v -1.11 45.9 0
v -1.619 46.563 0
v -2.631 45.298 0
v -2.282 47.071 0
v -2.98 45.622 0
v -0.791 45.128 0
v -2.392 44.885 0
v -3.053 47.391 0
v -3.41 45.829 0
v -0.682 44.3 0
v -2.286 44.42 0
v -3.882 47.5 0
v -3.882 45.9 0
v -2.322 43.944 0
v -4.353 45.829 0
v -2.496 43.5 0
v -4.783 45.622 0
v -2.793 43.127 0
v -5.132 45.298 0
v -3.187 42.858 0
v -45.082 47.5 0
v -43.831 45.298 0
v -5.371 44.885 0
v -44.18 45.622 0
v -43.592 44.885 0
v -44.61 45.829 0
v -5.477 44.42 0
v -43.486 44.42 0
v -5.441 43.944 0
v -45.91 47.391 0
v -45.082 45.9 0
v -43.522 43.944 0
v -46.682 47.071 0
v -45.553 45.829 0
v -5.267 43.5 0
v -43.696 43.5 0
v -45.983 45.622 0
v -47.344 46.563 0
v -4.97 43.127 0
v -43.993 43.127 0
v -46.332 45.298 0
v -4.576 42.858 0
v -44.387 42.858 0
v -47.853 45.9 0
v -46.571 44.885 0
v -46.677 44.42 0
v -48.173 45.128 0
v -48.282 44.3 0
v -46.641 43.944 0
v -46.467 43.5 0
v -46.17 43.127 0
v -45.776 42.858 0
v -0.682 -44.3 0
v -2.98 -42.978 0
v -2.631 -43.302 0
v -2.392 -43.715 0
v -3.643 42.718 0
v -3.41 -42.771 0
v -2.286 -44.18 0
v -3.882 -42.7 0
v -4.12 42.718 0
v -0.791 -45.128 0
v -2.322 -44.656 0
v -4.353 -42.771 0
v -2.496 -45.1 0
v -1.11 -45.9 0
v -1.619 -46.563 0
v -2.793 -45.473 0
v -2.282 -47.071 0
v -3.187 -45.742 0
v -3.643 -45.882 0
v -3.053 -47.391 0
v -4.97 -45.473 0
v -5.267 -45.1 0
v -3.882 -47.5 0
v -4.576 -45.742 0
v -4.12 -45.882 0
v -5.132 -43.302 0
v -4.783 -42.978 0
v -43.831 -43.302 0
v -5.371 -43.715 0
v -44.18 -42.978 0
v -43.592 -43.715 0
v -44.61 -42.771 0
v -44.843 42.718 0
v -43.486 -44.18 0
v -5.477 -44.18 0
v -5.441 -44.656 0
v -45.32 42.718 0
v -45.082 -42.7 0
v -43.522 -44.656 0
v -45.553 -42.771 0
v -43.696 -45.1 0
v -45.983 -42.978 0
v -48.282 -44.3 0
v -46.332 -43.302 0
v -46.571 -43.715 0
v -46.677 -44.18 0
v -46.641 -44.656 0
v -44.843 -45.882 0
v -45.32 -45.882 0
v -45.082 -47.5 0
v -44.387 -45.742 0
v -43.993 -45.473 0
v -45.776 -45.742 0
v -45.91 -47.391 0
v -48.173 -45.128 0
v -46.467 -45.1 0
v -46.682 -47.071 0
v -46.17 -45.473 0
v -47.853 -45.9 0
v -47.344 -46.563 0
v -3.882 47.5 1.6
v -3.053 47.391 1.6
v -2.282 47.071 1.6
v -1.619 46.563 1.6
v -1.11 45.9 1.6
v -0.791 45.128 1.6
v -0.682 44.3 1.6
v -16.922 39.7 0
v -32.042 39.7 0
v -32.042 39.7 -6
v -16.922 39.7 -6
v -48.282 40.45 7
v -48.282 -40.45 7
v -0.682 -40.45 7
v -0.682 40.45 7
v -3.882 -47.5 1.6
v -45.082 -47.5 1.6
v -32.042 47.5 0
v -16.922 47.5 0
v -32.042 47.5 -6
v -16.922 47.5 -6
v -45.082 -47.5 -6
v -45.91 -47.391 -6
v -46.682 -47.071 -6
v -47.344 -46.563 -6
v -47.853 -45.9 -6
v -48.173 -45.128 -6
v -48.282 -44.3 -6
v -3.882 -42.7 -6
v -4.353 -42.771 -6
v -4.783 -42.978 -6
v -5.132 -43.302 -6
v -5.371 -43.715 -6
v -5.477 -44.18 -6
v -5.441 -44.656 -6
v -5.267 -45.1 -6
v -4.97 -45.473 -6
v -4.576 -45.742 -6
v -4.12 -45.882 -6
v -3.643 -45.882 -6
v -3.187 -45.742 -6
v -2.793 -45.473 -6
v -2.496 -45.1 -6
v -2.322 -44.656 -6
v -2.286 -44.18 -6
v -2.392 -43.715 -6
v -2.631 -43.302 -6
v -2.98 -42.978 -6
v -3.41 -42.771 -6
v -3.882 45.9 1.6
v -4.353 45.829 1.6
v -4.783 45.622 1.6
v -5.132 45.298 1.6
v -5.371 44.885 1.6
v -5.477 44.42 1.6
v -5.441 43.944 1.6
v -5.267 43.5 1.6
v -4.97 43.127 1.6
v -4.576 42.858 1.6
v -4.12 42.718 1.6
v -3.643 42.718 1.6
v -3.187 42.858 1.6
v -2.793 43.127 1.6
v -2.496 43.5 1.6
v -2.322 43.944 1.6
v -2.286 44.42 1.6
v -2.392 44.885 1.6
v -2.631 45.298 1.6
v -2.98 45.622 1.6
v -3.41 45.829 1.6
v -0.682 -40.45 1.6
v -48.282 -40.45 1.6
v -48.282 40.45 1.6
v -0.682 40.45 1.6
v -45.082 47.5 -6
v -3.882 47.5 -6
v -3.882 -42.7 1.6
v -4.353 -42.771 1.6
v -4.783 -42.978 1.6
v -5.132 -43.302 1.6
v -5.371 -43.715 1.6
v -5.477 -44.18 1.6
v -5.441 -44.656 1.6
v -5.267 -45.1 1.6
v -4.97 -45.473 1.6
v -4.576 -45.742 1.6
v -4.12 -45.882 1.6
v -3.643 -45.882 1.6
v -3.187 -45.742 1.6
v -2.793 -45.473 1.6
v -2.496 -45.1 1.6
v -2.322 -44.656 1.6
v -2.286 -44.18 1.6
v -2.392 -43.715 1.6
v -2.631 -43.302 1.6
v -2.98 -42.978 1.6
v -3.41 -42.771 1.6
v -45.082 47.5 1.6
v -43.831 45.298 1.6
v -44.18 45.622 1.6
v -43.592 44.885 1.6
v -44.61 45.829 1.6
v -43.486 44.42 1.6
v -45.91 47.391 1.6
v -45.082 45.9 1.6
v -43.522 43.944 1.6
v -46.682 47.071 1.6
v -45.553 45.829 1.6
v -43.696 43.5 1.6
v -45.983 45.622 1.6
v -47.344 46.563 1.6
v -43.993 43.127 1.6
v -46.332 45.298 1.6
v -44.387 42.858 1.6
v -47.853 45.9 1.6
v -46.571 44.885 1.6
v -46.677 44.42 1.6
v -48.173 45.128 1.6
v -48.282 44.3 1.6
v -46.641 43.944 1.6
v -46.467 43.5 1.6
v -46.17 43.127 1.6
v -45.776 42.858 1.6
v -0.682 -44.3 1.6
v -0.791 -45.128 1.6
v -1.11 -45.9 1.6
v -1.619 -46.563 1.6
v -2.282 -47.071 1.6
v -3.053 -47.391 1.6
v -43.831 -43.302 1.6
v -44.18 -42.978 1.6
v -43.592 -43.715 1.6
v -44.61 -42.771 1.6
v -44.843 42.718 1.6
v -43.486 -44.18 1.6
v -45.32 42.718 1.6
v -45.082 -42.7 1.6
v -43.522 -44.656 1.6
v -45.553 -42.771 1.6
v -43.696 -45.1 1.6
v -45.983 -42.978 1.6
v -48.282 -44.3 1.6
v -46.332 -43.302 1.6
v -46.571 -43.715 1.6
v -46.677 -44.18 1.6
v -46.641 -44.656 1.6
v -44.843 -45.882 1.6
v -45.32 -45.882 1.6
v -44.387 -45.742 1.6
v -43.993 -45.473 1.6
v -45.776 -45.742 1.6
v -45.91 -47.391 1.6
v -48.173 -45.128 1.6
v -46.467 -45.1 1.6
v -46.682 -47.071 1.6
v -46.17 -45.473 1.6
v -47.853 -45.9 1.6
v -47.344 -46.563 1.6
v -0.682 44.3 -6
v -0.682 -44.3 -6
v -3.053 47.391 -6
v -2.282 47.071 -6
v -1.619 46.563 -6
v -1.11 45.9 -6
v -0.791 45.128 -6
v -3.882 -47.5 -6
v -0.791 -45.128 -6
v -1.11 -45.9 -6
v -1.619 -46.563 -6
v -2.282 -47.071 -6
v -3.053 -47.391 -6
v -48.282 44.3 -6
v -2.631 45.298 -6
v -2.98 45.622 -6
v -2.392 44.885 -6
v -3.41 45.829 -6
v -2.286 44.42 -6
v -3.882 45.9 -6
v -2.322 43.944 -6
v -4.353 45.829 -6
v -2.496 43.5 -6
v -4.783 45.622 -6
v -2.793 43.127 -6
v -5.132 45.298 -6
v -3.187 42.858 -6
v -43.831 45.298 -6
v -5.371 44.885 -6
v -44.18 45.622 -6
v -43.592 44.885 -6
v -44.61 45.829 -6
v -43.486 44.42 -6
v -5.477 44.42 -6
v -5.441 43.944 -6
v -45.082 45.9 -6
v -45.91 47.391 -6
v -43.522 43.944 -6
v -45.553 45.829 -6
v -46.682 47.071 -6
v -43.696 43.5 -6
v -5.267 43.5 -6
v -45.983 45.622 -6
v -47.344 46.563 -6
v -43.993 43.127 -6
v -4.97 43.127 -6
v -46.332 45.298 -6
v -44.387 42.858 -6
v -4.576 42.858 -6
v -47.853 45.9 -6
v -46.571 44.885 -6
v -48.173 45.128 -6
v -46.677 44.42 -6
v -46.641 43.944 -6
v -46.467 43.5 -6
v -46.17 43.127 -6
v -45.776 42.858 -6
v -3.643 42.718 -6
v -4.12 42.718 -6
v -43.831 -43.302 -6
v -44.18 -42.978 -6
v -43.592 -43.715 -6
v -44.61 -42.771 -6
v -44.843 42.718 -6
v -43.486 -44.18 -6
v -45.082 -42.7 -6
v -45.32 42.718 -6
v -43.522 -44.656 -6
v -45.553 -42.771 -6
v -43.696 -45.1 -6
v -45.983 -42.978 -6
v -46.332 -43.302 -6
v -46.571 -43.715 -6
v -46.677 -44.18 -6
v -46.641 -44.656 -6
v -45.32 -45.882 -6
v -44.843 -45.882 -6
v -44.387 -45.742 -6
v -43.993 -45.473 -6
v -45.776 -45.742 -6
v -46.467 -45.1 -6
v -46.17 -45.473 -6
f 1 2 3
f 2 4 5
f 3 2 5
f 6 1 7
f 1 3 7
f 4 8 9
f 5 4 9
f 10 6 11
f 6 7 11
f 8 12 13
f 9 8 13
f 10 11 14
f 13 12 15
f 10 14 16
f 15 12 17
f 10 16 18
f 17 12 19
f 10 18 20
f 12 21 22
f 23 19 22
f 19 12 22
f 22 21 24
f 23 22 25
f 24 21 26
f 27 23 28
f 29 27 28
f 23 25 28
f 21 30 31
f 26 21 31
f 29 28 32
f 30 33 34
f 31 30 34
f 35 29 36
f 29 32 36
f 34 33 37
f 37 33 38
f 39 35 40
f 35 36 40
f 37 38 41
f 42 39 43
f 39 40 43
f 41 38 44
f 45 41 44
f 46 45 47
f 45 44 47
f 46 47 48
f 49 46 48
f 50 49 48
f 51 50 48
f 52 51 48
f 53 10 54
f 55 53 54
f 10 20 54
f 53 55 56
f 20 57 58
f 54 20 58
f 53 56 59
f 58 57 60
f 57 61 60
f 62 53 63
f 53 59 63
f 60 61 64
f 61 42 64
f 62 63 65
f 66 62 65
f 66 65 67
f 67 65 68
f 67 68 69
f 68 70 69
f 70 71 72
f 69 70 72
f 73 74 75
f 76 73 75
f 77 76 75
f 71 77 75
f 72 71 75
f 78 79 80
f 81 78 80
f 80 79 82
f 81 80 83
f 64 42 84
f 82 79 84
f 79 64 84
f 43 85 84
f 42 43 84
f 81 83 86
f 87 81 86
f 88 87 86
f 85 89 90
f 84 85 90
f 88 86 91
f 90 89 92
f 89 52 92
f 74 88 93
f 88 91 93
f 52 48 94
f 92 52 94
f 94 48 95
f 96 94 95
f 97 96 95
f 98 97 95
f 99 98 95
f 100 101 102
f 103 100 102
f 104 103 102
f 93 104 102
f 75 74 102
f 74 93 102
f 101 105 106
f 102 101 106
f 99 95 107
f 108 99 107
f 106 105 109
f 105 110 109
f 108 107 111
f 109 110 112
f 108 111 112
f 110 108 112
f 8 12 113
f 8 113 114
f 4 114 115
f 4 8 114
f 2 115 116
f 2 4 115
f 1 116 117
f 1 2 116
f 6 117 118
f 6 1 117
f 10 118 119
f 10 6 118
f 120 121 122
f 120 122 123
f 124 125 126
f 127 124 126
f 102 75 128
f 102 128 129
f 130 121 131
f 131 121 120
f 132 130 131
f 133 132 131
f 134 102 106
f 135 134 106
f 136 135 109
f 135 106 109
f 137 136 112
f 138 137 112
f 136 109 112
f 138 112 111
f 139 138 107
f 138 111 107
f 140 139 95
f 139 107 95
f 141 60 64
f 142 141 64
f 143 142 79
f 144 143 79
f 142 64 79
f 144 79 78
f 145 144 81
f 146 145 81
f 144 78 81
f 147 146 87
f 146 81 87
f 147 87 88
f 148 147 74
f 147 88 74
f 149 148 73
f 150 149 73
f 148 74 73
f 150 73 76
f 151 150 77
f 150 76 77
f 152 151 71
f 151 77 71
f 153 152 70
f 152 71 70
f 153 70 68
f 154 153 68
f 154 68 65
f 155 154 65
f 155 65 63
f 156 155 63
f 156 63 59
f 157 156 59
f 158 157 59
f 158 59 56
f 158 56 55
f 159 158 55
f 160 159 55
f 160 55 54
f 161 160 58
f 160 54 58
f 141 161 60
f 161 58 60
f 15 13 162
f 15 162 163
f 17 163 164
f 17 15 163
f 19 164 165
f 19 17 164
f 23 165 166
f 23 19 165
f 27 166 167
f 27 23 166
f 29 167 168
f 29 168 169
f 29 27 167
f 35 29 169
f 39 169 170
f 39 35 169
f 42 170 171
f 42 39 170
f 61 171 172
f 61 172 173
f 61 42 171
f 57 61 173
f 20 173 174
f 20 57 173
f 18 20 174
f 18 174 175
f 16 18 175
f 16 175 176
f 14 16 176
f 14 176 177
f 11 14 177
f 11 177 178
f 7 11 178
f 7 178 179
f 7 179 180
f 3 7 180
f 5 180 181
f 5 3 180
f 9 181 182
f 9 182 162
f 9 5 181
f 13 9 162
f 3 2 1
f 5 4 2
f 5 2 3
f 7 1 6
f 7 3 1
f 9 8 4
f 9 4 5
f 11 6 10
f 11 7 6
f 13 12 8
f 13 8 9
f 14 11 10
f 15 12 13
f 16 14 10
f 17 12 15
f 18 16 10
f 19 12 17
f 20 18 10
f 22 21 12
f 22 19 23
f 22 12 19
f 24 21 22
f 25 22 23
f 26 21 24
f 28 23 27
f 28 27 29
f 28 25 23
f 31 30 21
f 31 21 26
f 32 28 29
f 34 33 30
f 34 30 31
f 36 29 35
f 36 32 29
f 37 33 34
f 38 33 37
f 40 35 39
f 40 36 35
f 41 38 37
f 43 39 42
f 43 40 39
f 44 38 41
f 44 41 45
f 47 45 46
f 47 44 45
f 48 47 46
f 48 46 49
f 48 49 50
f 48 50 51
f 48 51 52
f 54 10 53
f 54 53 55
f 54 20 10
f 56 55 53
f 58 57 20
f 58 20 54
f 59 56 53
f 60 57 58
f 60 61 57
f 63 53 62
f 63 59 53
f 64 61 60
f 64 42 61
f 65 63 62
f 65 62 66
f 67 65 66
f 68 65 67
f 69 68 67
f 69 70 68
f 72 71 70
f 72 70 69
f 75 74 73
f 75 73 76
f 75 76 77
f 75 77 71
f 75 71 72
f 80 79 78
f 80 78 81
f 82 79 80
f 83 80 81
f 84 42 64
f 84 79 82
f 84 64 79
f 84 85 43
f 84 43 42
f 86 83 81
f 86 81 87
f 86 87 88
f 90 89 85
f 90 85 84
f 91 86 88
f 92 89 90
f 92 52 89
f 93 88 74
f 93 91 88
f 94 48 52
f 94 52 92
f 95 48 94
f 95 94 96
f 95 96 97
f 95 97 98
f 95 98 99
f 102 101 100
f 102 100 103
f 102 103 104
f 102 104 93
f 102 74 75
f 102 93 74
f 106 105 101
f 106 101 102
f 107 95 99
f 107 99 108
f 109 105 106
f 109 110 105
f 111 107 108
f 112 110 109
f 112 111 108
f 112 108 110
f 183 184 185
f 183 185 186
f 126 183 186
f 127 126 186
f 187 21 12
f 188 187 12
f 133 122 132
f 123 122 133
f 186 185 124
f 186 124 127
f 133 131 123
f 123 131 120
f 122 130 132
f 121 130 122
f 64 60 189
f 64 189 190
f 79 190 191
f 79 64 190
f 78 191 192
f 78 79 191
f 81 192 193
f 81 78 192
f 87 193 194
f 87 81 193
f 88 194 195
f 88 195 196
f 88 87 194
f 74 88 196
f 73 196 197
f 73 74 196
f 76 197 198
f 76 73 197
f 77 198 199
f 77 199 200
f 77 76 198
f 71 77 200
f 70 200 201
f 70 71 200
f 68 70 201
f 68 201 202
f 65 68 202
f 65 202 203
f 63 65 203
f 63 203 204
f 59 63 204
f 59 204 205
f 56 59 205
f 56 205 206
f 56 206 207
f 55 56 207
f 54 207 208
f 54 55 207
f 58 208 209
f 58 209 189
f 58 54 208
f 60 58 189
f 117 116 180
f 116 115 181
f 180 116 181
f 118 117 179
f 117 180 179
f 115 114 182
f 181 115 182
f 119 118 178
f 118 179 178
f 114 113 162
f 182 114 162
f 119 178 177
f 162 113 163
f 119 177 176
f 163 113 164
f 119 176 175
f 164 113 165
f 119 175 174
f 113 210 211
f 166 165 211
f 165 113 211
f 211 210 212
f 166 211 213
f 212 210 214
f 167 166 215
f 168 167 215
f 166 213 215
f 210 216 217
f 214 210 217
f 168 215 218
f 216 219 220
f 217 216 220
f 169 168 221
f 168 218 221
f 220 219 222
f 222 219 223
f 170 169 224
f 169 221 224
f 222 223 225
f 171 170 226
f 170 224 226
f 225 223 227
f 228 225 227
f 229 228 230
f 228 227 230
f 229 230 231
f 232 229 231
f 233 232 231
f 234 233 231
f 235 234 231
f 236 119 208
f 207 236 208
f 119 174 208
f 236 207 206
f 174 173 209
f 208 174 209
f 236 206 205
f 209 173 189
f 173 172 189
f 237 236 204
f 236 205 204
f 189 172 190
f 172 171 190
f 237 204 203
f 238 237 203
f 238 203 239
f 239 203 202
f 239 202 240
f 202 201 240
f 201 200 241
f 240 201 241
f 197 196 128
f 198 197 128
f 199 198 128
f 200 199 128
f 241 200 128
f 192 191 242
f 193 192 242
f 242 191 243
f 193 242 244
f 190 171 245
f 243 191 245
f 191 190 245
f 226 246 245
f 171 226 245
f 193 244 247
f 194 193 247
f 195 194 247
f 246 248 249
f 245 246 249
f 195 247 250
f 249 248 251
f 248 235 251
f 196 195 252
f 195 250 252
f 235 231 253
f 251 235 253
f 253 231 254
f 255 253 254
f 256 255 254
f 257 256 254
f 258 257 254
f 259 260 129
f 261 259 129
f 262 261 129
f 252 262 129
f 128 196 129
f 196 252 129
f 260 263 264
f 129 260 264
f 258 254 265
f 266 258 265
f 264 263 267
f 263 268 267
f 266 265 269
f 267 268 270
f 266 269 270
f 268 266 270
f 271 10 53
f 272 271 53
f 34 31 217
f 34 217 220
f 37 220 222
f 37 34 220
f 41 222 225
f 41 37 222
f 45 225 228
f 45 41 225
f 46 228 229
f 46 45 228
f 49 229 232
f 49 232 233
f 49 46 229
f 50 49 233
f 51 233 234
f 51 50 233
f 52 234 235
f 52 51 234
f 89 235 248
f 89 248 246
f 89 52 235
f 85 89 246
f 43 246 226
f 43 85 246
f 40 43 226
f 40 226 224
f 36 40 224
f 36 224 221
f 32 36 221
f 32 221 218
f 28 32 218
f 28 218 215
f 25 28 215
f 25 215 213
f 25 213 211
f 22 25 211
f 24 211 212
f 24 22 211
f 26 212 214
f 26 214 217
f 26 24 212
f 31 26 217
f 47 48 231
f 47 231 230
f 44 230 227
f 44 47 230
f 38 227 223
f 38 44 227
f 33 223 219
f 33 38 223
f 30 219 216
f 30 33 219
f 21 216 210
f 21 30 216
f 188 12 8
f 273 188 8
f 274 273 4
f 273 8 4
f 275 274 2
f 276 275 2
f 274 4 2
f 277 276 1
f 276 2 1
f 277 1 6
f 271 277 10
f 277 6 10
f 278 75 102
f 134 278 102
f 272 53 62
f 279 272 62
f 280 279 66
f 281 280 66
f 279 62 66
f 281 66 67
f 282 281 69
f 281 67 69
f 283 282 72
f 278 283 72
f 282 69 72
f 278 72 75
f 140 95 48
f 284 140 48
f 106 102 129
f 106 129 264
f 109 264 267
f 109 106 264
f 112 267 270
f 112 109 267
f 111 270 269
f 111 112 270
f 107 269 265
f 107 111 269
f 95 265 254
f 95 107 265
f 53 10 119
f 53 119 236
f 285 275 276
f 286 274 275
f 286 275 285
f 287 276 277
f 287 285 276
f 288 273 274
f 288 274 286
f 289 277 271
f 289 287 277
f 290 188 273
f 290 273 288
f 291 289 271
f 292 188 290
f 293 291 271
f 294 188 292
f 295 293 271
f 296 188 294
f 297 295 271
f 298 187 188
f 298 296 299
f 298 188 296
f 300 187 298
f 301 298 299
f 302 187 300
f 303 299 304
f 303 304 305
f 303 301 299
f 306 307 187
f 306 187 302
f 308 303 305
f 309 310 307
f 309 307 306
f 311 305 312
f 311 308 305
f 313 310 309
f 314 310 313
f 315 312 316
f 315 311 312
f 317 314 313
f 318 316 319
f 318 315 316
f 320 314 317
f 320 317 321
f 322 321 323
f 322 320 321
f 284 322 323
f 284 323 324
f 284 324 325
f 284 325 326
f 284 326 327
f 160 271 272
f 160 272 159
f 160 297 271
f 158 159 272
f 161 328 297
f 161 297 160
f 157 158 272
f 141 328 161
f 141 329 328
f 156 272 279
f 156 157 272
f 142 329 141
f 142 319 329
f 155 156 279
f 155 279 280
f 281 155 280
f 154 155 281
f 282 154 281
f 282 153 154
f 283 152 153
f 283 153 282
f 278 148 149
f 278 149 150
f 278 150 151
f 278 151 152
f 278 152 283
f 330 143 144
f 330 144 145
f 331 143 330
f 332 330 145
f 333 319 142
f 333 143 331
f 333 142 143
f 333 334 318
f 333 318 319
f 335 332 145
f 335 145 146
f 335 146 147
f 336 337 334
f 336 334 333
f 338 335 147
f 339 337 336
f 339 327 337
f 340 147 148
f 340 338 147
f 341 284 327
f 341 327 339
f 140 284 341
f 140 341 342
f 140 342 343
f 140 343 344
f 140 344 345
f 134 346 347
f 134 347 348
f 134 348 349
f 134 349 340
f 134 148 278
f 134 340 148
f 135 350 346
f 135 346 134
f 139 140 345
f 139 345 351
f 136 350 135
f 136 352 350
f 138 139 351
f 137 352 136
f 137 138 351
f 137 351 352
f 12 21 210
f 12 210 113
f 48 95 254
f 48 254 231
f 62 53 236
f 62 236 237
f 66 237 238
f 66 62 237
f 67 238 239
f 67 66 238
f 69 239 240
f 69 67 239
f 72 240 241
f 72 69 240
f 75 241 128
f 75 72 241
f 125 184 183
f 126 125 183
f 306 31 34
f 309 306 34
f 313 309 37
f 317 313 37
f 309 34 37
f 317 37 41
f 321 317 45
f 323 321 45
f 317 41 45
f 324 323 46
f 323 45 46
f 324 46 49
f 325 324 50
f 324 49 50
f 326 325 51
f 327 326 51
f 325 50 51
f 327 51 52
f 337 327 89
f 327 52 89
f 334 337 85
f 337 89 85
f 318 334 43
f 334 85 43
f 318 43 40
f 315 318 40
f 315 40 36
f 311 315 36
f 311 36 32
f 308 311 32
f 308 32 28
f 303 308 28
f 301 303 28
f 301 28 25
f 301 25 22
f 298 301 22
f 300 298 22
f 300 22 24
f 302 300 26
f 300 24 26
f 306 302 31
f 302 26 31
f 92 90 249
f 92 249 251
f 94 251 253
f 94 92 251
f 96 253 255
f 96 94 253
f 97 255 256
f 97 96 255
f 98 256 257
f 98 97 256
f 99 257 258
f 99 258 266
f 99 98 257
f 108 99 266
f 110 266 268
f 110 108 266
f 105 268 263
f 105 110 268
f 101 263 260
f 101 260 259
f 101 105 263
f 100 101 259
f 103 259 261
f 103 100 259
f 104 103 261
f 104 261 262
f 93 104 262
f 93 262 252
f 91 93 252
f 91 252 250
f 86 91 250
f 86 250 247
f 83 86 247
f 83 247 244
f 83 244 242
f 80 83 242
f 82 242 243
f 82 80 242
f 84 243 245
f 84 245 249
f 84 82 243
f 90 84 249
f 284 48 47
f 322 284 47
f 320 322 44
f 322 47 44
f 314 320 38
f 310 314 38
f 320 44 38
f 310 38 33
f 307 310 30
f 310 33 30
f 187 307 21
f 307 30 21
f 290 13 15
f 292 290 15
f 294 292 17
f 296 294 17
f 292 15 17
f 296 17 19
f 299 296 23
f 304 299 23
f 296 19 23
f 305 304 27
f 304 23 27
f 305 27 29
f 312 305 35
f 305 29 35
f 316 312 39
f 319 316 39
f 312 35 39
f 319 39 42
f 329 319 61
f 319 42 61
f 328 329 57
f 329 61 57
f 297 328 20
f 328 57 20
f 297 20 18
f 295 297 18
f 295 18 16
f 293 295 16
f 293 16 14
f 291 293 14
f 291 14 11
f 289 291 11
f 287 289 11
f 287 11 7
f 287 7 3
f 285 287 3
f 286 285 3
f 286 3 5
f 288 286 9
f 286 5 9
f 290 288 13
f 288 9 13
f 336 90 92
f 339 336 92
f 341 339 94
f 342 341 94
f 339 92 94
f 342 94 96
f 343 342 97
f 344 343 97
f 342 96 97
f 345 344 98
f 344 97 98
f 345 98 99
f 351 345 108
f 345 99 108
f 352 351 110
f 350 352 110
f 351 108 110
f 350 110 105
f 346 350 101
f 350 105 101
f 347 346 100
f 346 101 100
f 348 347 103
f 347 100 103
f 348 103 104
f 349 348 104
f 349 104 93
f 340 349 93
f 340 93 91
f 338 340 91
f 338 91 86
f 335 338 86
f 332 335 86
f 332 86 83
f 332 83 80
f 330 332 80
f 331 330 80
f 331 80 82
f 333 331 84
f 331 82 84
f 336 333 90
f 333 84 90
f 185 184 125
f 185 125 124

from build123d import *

# Parameters (mm, degrees)
SKETCH1_R           = 1.6
BOSS_EXTRUDE1_DEPTH = 1.6
SKETCH2_W           = 47.6
SKETCH2_H           = 80.9
BOSS_EXTRUDE2_DEPTH = 5.4
SKETCH1_2_R         = 1.6
BOSS_EXTRUDE3_DEPTH = 6
SKETCH3_W           = 15.12
SKETCH3_H           = 7.8
BOSS_EXTRUDE4_DEPTH = 6


with BuildPart() as part:
    # Sketch1 → Boss-Extrude1 (new body)
    with BuildSketch(Plane(origin=(0, 0, 0), x_dir=(0, 1, 0), z_dir=(0, 0, 1))):
        with BuildLine():
            Line((-47.5, 3.881555812), (-47.5, 45.081555812))
            ThreePointArc((-47.5, 45.081555812), (-46.5627417, 47.344297512), (-44.3, 48.281555812))
            Line((-44.3, 48.281555812), (44.3, 48.281555812))
            ThreePointArc((44.3, 48.281555812), (46.5627417, 47.344297512), (47.5, 45.081555812))
            Line((47.5, 45.081555812), (47.5, 3.881555812))
            ThreePointArc((47.5, 3.881555812), (46.5627417, 1.618814112), (44.3, 0.681555812))
            Line((44.3, 0.681555812), (-44.3, 0.681555812))
            ThreePointArc((-44.3, 0.681555812), (-46.5627417, 1.618814112), (-47.5, 3.881555812))
        make_face()
        with Locations((-44.3, 45.081555812)):
            Circle(SKETCH1_R, mode=Mode.SUBTRACT)
        with Locations((-44.3, 3.881555812)):
            Circle(SKETCH1_R, mode=Mode.SUBTRACT)
        with Locations((44.3, 3.881555812)):
            Circle(SKETCH1_R, mode=Mode.SUBTRACT)
        with Locations((44.3, 45.081555812)):
            Circle(SKETCH1_R, mode=Mode.SUBTRACT)
    extrude(amount=BOSS_EXTRUDE1_DEPTH)


with BuildPart() as body_2:
    # Sketch2 → Boss-Extrude2 (new body)
    with BuildSketch(Plane.XY.offset(1.6)):
        with Locations((-24.481555812, 0)):
            Rectangle(SKETCH2_W, SKETCH2_H)
    extrude(amount=BOSS_EXTRUDE2_DEPTH)


with BuildPart() as body_3:
    # Sketch1<2> → Boss-Extrude3 (new body)
    with BuildSketch(Plane(origin=(0, 0, 0), x_dir=(0, 1, 0), z_dir=(0, 0, 1))):
        with BuildLine():
            Line((-47.5, 3.881555812), (-47.5, 45.081555812))
            ThreePointArc((-47.5, 45.081555812), (-46.5627417, 47.344297512), (-44.3, 48.281555812))
            Line((-44.3, 48.281555812), (44.3, 48.281555812))
            ThreePointArc((44.3, 48.281555812), (46.5627417, 47.344297512), (47.5, 45.081555812))
            Line((47.5, 45.081555812), (47.5, 3.881555812))
            ThreePointArc((47.5, 3.881555812), (46.5627417, 1.618814112), (44.3, 0.681555812))
            Line((44.3, 0.681555812), (-44.3, 0.681555812))
            ThreePointArc((-44.3, 0.681555812), (-46.5627417, 1.618814112), (-47.5, 3.881555812))
        make_face()
        with Locations((-44.3, 45.081555812)):
            Circle(SKETCH1_2_R, mode=Mode.SUBTRACT)
        with Locations((-44.3, 3.881555812)):
            Circle(SKETCH1_2_R, mode=Mode.SUBTRACT)
        with Locations((44.3, 3.881555812)):
            Circle(SKETCH1_2_R, mode=Mode.SUBTRACT)
        with Locations((44.3, 45.081555812)):
            Circle(SKETCH1_2_R, mode=Mode.SUBTRACT)
    extrude(amount=-BOSS_EXTRUDE3_DEPTH)


with BuildPart() as body_4:
    # Sketch3 → Boss-Extrude4 (new body)
    with BuildSketch(Plane(origin=(0, 0, 0), x_dir=(1, 0, 0), z_dir=(0, 0, -1))):
        with Locations((-24.481555812, -43.6)):
            Rectangle(SKETCH3_W, SKETCH3_H)
    extrude(amount=BOSS_EXTRUDE4_DEPTH)


solid = Compound([part.part, body_2.part, body_3.part, body_4.part])
